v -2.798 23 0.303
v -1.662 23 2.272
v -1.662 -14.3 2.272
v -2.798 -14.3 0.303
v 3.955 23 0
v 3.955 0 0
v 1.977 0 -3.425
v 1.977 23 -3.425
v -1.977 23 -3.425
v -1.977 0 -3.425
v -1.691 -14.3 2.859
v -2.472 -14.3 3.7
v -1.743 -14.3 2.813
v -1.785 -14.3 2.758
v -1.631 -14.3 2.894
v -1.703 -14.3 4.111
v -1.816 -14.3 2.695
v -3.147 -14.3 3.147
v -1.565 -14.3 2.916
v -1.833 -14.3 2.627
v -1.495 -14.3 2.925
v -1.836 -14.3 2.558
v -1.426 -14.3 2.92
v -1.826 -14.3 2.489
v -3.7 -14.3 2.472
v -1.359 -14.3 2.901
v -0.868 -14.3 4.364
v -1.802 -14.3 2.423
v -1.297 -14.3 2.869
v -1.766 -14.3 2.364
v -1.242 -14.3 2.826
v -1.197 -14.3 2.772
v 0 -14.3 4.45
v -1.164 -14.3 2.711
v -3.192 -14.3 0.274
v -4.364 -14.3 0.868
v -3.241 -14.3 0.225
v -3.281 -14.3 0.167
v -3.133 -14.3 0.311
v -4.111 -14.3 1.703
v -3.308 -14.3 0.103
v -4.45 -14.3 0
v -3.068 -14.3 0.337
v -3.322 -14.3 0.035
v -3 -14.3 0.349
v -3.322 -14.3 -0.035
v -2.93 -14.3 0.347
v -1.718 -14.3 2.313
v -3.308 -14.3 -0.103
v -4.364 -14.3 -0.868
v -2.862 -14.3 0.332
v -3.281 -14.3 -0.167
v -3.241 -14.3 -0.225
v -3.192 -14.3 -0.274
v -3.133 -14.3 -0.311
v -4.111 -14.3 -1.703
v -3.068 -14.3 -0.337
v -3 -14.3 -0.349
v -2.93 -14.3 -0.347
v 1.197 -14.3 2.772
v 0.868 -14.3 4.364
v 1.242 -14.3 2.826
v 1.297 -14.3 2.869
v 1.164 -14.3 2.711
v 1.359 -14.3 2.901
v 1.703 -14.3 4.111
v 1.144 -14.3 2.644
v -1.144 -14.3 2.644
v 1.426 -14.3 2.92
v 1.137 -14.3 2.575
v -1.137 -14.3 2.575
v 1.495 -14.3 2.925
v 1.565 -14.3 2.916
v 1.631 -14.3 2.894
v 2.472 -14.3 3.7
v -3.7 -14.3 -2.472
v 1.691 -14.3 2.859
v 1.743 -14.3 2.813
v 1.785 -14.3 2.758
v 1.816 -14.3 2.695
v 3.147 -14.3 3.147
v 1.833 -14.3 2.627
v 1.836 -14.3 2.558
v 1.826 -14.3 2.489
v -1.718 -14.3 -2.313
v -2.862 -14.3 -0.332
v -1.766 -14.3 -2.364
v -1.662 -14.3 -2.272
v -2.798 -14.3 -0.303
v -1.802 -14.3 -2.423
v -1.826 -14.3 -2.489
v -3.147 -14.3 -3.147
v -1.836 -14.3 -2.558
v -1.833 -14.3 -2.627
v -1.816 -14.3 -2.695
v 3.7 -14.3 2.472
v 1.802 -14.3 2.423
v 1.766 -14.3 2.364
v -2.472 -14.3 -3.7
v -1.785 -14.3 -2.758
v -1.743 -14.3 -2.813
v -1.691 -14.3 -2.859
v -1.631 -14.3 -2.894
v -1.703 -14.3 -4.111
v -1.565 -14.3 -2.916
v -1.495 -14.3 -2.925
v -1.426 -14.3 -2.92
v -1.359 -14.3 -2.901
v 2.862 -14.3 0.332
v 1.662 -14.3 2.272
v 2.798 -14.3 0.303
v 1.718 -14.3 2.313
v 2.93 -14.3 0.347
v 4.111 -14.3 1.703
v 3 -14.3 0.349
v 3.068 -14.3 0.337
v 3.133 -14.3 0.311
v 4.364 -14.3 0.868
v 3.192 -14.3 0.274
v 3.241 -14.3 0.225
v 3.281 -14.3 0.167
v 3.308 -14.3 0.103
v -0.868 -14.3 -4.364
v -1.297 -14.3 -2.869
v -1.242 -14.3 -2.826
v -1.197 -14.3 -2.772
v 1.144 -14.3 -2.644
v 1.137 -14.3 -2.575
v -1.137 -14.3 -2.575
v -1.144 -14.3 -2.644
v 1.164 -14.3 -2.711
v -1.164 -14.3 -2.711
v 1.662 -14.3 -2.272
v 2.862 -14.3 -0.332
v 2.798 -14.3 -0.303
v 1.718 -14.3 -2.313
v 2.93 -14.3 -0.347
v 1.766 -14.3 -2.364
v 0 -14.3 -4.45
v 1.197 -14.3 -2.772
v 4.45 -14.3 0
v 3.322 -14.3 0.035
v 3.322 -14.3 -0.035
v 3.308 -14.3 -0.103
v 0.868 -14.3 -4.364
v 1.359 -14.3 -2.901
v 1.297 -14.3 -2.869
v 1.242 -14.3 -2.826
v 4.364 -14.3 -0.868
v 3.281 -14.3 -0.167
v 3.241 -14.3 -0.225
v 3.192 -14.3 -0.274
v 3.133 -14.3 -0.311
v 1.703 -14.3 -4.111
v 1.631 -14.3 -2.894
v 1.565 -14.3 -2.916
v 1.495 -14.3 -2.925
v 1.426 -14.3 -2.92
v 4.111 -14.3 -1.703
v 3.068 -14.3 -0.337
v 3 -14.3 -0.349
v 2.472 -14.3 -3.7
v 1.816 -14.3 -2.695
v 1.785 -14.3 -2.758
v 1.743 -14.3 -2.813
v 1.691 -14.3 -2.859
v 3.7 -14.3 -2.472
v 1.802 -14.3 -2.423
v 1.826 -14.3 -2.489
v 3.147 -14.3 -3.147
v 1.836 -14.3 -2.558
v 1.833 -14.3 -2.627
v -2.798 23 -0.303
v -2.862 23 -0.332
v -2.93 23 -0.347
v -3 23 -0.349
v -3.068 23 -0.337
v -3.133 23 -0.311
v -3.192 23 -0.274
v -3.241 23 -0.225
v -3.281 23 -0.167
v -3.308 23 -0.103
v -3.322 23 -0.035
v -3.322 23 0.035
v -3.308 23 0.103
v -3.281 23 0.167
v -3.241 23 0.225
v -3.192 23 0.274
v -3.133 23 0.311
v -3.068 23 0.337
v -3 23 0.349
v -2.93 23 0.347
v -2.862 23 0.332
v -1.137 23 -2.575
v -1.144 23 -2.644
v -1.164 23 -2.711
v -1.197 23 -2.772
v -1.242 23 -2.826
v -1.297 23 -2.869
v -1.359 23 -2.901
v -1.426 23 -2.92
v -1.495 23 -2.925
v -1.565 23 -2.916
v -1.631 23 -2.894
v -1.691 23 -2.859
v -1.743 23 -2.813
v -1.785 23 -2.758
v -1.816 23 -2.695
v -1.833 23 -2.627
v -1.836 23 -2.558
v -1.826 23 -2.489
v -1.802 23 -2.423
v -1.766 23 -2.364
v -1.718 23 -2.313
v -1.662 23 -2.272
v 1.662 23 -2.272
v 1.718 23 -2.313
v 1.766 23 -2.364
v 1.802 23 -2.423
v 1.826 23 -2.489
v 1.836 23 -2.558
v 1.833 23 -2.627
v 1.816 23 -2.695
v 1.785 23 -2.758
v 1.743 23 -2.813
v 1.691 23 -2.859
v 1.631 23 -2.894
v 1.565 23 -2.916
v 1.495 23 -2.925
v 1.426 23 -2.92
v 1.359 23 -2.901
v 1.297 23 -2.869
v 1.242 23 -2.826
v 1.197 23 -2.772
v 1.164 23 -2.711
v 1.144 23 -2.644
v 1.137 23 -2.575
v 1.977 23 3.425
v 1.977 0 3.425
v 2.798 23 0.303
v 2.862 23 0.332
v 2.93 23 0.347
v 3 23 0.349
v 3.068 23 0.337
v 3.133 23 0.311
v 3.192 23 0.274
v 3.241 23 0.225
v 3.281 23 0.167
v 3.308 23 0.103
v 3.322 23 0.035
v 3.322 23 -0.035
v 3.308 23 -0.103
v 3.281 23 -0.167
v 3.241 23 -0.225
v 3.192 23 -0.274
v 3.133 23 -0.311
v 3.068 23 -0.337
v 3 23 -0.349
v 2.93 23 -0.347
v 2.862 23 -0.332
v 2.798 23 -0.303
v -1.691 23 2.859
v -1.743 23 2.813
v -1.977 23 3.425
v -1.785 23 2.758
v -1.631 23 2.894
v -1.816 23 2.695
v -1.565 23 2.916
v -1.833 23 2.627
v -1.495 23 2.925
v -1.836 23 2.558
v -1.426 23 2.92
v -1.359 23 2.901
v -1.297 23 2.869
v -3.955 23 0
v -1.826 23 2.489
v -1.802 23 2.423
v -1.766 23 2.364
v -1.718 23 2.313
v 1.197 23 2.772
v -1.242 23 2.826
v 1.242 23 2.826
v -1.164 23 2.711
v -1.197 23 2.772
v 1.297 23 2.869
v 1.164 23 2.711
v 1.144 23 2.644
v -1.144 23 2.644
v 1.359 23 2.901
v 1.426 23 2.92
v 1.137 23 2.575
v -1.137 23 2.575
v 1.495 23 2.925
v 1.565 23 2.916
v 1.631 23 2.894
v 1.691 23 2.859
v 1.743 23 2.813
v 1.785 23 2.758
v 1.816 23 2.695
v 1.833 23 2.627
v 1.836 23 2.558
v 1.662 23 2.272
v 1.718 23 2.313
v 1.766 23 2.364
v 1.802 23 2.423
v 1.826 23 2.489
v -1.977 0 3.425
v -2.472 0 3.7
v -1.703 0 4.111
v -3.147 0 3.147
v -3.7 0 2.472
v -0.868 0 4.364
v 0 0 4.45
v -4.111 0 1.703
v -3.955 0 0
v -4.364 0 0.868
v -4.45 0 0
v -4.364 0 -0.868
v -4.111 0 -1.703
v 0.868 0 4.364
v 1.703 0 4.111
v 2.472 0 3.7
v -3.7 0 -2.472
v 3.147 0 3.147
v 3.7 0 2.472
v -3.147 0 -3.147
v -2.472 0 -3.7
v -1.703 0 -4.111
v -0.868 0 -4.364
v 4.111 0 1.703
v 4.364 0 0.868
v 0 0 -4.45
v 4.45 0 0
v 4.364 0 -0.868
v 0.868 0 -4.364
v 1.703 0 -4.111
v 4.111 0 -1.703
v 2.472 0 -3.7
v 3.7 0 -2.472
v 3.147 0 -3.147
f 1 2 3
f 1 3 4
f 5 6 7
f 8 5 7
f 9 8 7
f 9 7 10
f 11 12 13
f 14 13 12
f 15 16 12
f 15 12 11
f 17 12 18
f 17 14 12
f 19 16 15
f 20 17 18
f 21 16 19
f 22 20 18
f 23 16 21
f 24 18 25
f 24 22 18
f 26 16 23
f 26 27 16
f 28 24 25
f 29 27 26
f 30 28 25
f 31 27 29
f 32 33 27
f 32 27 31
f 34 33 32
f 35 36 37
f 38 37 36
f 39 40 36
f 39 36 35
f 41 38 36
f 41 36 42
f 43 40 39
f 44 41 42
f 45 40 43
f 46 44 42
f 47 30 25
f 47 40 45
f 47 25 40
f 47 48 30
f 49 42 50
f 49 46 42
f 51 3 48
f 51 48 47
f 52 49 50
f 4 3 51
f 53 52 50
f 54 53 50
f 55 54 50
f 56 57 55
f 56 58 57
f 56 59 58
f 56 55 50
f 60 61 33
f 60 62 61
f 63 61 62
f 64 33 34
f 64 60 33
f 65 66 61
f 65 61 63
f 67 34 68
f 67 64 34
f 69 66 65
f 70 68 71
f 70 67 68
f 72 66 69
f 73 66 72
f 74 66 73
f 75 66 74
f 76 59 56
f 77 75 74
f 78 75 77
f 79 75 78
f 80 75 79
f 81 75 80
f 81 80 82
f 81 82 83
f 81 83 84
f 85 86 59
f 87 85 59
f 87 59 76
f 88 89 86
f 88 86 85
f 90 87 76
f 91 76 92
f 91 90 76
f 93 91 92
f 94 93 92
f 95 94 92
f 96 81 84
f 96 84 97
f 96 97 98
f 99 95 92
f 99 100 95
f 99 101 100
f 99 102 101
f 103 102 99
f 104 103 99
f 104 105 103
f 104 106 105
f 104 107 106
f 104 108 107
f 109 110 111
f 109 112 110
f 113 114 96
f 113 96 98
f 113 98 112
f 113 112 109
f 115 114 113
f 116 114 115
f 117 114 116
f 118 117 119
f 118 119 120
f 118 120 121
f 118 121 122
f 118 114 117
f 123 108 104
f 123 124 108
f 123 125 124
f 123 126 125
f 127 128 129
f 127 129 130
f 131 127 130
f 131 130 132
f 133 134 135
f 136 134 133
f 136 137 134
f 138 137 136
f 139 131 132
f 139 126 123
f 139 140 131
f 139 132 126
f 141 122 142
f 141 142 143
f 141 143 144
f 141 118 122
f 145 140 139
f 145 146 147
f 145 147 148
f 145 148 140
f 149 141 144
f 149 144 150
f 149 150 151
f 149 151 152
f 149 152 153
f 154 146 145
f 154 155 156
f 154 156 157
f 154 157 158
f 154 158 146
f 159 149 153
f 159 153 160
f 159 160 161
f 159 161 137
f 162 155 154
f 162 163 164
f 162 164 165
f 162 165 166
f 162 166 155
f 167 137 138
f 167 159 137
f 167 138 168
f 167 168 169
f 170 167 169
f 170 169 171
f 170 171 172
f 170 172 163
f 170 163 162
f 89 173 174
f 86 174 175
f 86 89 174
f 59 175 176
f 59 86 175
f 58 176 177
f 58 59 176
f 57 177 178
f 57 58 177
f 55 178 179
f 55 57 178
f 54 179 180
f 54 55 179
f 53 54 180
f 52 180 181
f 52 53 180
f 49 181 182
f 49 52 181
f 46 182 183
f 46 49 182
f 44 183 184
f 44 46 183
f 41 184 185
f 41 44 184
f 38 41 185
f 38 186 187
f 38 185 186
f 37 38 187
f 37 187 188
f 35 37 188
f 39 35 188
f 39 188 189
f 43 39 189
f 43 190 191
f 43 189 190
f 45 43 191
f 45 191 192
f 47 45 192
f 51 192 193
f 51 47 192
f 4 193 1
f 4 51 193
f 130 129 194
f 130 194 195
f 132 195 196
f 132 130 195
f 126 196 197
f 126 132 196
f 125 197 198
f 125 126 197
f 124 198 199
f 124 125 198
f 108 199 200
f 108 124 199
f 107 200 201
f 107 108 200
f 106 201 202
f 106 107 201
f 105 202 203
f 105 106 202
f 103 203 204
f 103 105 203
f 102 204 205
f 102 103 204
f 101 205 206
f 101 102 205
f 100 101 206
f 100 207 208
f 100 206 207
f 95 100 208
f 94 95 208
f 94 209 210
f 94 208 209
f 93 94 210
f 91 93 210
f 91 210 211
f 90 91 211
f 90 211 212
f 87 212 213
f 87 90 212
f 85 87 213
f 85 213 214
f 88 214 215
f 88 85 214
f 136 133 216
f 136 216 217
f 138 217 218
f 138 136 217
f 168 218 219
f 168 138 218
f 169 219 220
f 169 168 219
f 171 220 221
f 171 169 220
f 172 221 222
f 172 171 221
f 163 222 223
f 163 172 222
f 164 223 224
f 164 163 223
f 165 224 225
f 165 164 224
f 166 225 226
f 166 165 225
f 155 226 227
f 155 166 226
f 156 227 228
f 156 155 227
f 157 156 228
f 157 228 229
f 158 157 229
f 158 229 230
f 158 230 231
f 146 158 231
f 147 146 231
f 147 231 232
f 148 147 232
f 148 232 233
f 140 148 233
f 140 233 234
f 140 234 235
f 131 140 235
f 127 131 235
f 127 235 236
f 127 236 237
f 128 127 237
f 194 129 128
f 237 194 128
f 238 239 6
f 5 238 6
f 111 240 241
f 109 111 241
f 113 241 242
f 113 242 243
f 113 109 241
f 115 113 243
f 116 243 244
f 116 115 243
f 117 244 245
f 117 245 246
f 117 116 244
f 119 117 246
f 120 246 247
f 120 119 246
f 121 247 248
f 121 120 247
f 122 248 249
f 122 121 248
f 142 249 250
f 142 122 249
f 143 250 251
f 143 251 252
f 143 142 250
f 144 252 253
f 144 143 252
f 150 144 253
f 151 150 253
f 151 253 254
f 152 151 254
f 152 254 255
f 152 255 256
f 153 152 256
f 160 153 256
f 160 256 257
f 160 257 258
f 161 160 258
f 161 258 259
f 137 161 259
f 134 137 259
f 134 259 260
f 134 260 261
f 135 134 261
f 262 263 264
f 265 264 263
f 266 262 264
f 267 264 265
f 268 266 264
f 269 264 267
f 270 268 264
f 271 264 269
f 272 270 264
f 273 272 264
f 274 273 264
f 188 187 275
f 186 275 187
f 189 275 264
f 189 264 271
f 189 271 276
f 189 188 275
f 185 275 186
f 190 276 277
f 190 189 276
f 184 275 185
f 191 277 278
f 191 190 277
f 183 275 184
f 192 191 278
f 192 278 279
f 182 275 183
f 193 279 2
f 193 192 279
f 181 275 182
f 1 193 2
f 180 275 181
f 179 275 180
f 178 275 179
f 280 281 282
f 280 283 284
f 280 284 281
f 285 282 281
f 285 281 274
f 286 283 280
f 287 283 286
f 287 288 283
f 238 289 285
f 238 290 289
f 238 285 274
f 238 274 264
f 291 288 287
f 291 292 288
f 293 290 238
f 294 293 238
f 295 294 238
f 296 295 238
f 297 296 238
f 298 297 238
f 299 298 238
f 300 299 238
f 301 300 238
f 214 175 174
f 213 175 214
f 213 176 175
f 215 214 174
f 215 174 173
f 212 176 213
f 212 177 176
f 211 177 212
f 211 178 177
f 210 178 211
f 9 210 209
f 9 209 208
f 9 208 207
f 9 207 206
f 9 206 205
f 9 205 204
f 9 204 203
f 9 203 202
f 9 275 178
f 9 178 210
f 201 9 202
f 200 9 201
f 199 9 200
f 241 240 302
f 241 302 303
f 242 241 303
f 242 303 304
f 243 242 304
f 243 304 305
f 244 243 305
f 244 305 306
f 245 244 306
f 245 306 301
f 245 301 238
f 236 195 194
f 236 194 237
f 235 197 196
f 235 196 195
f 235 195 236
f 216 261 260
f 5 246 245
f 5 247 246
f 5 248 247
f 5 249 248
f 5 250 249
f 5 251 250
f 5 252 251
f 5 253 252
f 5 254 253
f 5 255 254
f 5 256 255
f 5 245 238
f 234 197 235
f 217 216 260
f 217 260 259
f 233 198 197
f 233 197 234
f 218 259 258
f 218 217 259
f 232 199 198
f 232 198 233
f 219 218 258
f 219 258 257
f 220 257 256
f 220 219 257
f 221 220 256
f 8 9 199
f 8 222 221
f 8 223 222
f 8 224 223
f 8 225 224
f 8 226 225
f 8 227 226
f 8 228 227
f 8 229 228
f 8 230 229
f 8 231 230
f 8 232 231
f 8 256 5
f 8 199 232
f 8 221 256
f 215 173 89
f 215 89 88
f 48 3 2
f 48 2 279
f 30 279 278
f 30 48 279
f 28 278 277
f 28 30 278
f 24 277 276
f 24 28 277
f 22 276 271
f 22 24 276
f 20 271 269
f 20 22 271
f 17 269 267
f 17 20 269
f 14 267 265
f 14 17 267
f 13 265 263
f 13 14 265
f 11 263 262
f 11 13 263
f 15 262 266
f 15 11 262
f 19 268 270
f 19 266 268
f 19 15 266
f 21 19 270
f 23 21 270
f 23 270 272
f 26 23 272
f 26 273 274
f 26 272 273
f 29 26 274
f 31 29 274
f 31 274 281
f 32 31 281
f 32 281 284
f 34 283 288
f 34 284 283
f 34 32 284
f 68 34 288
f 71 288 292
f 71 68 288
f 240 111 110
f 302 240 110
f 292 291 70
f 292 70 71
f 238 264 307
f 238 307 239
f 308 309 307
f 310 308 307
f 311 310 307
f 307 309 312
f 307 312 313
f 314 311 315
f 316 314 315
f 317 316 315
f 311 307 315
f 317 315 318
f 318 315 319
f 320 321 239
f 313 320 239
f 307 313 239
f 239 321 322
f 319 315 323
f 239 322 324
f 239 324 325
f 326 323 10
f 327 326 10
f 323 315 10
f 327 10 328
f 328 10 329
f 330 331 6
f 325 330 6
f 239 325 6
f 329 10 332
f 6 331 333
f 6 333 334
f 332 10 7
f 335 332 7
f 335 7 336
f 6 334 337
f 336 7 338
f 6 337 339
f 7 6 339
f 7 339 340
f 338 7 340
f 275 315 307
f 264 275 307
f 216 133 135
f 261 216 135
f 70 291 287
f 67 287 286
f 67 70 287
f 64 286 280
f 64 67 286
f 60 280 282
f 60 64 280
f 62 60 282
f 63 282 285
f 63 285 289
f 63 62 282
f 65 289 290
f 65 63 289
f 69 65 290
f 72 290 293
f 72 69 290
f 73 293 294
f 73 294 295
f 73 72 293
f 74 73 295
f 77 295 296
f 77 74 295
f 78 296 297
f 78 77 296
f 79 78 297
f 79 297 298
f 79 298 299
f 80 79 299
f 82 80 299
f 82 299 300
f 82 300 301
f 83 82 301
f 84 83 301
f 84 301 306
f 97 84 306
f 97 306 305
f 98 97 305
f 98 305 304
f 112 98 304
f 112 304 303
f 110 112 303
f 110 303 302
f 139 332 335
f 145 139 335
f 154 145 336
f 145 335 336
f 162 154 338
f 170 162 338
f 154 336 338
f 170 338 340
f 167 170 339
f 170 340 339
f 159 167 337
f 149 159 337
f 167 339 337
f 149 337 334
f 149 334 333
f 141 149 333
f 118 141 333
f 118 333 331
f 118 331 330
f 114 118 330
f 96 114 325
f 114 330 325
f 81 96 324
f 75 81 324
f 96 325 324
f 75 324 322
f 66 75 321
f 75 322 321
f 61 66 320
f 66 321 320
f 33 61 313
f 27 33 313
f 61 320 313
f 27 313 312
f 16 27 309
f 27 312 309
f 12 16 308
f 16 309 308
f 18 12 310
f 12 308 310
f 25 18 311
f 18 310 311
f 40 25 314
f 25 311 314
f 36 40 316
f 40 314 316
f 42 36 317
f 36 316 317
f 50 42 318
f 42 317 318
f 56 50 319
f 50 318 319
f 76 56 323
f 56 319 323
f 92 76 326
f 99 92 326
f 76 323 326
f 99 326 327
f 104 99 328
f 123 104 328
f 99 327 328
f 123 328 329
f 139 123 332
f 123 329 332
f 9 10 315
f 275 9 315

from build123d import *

# Parameters (mm, degrees)
BOSS_EXTRUDE1_DEPTH     = 23
SKETCH2_R               = 4.45
BOSS_EXTRUDE2_DEPTH     = 14.3
CUT_EXTRUDE1_DEPTH      = 38.827172773
CUT_EXTRUDE1_DEPTH_BACK = 38.827172773
SKETCH4_R               = 0.35


with BuildPart() as part:
    # Sketch1 → Boss-Extrude1 (new body)
    with BuildSketch(Plane(origin=(0, 0, 0), x_dir=(1, 0, 0), z_dir=(0, 1, 0))):
        Polygon((1.977424672, 3.425), (-1.977424672, 3.425), (-3.954849344, 0), (-1.977424672, -3.425), (1.977424672, -3.425), (3.954849344, 0), align=None)
        Polygon((2.973353886, 0), (1.486676943, 2.575), (-1.486676943, 2.575), (-2.973353886, 0), (-1.486676943, -2.575), (1.486676943, -2.575), align=None, mode=Mode.SUBTRACT)
    extrude(amount=BOSS_EXTRUDE1_DEPTH)

    # Sketch2 → Boss-Extrude2 (add)
    with BuildSketch(Plane.XZ):
        with Locations(Location((0, 0, 0), (0, 0, 270))):
            Circle(SKETCH2_R)
        Polygon((2.973353886, 0), (1.486676943, 2.575), (-1.486676943, 2.575), (-2.973353886, 0), (-1.486676943, -2.575), (1.486676943, -2.575), align=None, mode=Mode.SUBTRACT)
    extrude(amount=BOSS_EXTRUDE2_DEPTH)

    # Sketch4 → Cut-Extrude1 (cut, two sides: drawn at the far end of the back side and taken through both)
    with BuildSketch(Plane(origin=(0, 23, 0), x_dir=(1, 0, 0), z_dir=(0, 1, 0)).offset(-CUT_EXTRUDE1_DEPTH_BACK)):
        with Locations((1.486676943, 2.575)):
            Circle(SKETCH4_R)
        with Locations((2.973353886, 0)):
            Circle(SKETCH4_R)
        with Locations((1.486676943, -2.575)):
            Circle(SKETCH4_R)
        with Locations((-1.486676943, -2.575)):
            Circle(SKETCH4_R)
        with Locations((-2.973353886, 0)):
            Circle(SKETCH4_R)
        with Locations((-1.486676943, 2.575)):
            Circle(SKETCH4_R)
    extrude(amount=CUT_EXTRUDE1_DEPTH + CUT_EXTRUDE1_DEPTH_BACK, mode=Mode.SUBTRACT)


solid = part.part
